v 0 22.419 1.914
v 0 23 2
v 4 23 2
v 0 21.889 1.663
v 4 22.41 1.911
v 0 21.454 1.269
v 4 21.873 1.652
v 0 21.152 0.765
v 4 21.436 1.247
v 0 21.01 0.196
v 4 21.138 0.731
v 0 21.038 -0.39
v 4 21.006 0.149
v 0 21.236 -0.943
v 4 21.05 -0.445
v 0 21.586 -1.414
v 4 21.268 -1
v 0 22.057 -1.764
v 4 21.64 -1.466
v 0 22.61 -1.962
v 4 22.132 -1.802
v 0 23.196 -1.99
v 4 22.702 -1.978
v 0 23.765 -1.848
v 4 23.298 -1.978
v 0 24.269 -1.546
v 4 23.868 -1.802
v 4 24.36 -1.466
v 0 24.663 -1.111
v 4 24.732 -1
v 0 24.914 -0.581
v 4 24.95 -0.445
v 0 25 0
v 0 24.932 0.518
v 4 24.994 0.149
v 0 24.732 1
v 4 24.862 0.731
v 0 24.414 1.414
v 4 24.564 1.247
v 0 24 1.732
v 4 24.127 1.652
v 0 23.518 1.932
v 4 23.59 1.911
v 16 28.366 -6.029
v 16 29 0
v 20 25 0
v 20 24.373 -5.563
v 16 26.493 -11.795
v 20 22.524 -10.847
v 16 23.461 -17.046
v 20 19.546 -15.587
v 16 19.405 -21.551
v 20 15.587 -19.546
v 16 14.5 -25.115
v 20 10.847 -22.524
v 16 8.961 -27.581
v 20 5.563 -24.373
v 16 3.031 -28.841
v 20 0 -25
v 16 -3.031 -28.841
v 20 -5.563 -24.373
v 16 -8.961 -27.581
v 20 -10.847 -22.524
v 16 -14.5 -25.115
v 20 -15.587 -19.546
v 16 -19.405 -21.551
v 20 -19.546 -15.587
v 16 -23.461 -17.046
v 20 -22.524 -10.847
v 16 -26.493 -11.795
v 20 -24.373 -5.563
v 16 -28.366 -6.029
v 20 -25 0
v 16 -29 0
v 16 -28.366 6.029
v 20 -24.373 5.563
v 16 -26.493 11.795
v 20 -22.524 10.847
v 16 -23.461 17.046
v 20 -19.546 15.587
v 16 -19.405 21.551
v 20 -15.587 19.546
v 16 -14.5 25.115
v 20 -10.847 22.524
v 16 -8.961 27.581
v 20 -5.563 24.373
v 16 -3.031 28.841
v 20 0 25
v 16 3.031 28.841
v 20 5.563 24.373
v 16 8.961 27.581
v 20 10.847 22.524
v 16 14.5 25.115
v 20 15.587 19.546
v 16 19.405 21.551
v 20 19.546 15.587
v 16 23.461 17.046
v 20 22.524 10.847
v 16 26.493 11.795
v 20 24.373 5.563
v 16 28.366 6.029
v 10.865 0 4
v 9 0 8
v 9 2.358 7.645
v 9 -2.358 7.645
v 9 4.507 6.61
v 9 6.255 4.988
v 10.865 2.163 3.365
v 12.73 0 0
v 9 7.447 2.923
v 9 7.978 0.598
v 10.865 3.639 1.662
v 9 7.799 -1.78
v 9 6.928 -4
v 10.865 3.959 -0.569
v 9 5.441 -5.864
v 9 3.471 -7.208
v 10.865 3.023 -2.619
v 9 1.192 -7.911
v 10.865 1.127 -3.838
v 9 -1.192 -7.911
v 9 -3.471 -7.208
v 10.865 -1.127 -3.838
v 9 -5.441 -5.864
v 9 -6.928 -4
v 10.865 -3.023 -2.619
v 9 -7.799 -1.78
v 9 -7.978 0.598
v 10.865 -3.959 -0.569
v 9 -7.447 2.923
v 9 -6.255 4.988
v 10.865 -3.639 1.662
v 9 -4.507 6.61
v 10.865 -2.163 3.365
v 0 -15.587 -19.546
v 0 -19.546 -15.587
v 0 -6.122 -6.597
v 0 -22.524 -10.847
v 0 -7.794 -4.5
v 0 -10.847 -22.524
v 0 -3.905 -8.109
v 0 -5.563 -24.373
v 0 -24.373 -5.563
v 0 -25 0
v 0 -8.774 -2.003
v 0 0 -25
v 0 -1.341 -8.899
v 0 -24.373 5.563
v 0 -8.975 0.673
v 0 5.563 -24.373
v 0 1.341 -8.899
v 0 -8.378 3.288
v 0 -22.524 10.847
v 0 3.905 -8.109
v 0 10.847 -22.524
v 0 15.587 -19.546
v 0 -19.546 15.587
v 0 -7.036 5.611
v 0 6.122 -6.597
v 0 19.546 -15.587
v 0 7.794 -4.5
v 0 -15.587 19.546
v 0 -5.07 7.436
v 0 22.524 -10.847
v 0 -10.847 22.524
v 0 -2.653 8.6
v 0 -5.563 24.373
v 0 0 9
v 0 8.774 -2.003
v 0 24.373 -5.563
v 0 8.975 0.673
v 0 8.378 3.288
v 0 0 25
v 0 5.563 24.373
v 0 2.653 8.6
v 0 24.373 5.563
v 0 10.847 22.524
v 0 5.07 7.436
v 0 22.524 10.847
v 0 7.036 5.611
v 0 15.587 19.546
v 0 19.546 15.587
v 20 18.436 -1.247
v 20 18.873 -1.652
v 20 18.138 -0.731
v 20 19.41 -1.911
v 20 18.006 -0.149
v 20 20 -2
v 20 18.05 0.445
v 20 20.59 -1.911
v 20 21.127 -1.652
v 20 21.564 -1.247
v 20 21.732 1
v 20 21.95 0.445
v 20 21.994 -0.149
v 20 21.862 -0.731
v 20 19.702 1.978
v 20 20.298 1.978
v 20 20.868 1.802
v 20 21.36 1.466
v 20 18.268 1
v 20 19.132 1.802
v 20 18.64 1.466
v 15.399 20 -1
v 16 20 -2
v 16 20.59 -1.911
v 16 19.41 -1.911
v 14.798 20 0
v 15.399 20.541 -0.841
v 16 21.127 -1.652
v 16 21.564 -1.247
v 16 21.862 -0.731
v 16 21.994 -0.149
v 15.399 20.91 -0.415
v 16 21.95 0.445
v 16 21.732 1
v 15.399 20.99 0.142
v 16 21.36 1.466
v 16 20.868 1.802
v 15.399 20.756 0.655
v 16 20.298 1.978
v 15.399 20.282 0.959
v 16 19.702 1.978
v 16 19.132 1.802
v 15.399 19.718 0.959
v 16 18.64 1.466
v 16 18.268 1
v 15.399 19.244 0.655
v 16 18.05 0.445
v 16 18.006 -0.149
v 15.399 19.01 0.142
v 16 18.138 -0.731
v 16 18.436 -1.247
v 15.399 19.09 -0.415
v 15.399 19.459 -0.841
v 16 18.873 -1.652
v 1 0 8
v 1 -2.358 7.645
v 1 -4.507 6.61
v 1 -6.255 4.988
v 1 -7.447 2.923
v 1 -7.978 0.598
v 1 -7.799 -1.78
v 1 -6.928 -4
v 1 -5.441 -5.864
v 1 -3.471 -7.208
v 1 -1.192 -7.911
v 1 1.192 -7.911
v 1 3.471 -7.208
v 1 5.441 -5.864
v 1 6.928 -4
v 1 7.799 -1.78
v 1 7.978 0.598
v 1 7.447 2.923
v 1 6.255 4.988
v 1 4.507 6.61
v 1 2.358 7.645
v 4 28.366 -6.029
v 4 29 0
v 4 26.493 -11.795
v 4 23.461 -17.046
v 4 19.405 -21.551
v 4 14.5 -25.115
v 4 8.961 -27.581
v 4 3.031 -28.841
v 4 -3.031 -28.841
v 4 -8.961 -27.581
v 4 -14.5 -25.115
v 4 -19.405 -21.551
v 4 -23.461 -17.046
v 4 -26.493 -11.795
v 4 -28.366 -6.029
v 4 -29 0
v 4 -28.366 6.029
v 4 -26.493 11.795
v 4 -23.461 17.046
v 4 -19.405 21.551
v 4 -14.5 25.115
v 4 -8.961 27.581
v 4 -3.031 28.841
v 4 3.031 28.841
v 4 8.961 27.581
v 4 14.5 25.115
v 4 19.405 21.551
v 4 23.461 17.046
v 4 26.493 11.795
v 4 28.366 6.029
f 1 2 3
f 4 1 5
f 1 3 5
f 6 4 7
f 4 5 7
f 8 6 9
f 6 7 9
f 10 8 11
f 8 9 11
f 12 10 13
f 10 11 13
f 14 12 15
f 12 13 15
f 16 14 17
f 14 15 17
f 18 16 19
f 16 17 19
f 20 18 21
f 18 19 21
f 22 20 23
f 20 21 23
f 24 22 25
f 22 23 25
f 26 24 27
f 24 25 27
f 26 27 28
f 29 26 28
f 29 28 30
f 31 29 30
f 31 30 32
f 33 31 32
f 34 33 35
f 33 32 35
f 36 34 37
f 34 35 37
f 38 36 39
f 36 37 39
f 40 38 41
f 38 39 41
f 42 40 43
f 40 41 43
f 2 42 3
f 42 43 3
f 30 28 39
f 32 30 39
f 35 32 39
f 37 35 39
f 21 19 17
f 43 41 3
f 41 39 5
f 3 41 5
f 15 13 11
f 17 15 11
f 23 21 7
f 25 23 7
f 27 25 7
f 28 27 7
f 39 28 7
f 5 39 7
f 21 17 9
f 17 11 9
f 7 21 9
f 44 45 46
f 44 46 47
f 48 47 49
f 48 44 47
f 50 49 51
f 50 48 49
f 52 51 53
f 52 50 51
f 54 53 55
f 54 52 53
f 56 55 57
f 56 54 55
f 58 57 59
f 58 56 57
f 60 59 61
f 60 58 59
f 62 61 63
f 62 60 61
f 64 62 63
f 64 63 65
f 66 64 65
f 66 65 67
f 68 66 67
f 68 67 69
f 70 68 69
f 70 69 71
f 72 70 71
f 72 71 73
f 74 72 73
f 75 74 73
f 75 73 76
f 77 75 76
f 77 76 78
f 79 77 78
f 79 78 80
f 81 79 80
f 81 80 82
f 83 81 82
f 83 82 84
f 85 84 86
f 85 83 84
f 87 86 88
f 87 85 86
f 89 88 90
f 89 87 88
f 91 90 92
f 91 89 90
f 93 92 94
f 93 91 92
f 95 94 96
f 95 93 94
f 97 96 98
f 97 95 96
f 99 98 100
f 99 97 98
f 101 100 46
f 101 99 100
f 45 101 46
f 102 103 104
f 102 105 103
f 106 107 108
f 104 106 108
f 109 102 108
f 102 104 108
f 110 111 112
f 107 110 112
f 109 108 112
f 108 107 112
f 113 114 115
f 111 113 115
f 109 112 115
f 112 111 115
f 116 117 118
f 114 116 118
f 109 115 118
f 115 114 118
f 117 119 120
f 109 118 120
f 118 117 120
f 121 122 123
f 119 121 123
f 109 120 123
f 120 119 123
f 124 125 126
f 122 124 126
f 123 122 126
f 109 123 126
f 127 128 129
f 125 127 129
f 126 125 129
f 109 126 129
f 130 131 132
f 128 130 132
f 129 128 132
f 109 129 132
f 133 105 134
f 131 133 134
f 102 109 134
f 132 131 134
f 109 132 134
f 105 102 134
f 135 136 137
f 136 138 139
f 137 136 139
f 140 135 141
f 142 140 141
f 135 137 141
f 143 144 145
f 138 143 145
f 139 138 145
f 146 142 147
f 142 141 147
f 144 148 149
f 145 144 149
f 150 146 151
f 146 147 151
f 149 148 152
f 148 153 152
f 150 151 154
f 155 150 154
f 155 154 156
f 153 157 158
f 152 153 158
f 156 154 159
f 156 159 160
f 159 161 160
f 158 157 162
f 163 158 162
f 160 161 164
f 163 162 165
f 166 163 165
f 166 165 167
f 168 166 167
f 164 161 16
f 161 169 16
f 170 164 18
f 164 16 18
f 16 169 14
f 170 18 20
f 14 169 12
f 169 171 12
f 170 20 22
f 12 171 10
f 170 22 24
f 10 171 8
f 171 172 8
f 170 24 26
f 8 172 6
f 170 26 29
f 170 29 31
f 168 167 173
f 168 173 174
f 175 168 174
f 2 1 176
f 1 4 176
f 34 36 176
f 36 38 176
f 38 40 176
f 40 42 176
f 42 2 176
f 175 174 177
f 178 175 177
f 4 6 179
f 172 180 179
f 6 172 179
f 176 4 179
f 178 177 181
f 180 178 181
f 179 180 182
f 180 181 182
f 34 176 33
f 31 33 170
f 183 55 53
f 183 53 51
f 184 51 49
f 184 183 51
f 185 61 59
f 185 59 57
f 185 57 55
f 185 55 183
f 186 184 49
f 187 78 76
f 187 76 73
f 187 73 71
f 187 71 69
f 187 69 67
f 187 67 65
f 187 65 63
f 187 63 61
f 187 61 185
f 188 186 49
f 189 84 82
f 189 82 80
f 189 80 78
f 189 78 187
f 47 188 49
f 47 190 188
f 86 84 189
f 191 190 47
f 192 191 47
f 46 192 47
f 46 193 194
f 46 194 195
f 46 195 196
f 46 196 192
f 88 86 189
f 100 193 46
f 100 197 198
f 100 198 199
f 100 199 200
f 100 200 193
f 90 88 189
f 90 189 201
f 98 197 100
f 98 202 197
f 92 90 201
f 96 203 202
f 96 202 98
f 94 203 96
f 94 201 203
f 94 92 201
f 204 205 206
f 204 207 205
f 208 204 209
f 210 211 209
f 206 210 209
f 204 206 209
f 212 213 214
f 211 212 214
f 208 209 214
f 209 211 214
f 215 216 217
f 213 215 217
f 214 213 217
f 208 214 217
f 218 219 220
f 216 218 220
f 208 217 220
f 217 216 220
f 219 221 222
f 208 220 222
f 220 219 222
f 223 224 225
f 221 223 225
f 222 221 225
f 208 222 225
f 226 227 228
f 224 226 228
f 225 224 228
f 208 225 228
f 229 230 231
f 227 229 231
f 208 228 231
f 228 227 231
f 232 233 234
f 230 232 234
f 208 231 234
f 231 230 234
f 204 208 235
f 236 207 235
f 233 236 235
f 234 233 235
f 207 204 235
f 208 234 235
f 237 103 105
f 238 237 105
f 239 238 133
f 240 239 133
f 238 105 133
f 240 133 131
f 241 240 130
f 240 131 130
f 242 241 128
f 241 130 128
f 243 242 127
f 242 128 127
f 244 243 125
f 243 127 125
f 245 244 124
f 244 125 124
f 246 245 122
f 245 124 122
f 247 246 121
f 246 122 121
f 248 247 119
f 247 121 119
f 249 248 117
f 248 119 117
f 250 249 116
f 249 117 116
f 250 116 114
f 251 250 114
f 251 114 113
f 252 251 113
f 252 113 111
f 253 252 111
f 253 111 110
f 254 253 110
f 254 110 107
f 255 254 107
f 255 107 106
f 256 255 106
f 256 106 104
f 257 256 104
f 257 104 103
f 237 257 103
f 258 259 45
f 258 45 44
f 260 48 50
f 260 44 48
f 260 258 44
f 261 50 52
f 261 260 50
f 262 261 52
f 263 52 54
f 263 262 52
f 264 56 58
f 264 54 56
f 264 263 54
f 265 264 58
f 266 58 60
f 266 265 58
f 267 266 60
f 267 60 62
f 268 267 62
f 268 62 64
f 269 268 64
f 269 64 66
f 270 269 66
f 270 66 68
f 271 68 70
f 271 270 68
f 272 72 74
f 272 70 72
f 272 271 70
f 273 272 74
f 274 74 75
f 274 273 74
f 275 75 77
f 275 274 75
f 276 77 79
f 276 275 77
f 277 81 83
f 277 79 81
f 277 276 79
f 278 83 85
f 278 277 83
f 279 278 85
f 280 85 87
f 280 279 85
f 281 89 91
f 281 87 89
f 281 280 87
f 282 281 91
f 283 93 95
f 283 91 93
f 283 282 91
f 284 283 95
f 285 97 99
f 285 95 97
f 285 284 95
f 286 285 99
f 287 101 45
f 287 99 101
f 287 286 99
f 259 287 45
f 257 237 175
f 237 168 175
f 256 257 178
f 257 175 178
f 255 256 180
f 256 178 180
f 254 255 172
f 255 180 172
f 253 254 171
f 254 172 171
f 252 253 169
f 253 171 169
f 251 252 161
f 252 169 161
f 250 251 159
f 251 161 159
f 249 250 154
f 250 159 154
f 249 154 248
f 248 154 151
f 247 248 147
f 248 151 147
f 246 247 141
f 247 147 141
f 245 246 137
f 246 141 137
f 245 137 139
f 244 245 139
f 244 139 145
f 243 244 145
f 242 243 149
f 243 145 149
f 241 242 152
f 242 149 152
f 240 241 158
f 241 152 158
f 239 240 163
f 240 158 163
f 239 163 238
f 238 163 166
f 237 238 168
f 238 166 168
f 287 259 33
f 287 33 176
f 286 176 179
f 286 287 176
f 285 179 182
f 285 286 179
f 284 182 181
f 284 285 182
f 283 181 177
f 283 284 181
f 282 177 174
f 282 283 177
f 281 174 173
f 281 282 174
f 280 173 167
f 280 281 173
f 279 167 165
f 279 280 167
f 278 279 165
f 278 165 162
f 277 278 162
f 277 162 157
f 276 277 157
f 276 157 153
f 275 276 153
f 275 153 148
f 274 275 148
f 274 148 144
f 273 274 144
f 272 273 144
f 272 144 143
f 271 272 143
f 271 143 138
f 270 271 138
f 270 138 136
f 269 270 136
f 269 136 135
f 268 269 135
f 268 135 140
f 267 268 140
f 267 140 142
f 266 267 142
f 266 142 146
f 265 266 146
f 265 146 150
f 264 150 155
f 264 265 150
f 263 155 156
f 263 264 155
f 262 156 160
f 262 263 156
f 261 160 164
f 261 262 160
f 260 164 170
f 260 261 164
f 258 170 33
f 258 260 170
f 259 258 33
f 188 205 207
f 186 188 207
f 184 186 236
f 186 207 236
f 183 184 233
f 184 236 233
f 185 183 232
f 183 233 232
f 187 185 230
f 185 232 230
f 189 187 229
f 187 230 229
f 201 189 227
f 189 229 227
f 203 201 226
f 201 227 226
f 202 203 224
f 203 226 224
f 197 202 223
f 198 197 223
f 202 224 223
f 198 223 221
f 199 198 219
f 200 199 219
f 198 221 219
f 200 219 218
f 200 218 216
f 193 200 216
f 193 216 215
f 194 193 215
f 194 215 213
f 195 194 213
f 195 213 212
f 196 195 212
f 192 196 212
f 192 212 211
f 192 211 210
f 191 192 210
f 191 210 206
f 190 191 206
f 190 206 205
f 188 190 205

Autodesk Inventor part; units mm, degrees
ref_plane "YZ Plane" through (0, 0, 0) normal (1, 0, 0) x (0, 1, 0)
ref_plane "XZ Plane" through (0, 0, 0) normal (0, 1, 0) x (-1, 0, 0)
ref_plane "XY Plane" through (0, 0, 0) normal (0, 0, 1) x (1, 0, 0)
sketch "Эскиз5" plane through (0, 0, 0) normal (0, 0, 1) x (1, 0, 0)
  line L0 (0, 0) -> (20, 0)
  line L1 (20, 0) -> (20, 25)
  line L2 (16, 29) -> (4, 29)
  line L3 (0, 25) -> (0, 0)
  line L4 (4, 29) -> (0, 25)
  line L5 (16, 29) -> (20, 25)
  point P0 (20, 29)
  point P1 (0, 29)
  dimension "d43" = 20
  dimension "d44" = 29
  dimension "d45" = 4
  dimension "d46" = 4
  dimension "d47" = 4
  dimension "d48" = 4
revolve "Вращение3" add sketch "Эскиз5" angle 360 about axis through (0, 0, 0) along (1, 0, 0)
sketch "Эскиз6" plane through (0, 0, 0) normal (-1, 0, 0) x (0, 0, 1)
  point P0 (0, 0)
  point P1 (0, 0)
hole "Отверстие3" at (0, 0, 0) direction (1, 0, 0) diameter 16 depth 9 tip angle 130 countersink diameter 18 countersink angle 90
sketch "Эскиз7" plane through (0, 0, 0) normal (-1, 0, 0) x (0, 0, 1)
  line L0 (0, 0) -> (0, 23) construction
  dimension "d57" = 23
hole "Отверстие4" at (0, 23, 0) direction (1, 0, 0) diameter 4 depth 4
sketch "Эскиз8" plane through (20, 0, 0) normal (1, 0, 0) x (0, 0, -1)
  line L0 (0, 0) -> (0, 20) construction
  dimension "d65" = 20
hole "Отверстие5" at (20, 20, 0) direction (-1, 0, 0) diameter 4 depth 4 tip angle 118
thread "Резьба3" size "M16x2" class "6H" standard "ANSI Metric M Profile" full length
equation "\"d46\" = d45"
equation "\"d47\" = d45"
equation "\"d48\" = d47"
properties part number "711136"
